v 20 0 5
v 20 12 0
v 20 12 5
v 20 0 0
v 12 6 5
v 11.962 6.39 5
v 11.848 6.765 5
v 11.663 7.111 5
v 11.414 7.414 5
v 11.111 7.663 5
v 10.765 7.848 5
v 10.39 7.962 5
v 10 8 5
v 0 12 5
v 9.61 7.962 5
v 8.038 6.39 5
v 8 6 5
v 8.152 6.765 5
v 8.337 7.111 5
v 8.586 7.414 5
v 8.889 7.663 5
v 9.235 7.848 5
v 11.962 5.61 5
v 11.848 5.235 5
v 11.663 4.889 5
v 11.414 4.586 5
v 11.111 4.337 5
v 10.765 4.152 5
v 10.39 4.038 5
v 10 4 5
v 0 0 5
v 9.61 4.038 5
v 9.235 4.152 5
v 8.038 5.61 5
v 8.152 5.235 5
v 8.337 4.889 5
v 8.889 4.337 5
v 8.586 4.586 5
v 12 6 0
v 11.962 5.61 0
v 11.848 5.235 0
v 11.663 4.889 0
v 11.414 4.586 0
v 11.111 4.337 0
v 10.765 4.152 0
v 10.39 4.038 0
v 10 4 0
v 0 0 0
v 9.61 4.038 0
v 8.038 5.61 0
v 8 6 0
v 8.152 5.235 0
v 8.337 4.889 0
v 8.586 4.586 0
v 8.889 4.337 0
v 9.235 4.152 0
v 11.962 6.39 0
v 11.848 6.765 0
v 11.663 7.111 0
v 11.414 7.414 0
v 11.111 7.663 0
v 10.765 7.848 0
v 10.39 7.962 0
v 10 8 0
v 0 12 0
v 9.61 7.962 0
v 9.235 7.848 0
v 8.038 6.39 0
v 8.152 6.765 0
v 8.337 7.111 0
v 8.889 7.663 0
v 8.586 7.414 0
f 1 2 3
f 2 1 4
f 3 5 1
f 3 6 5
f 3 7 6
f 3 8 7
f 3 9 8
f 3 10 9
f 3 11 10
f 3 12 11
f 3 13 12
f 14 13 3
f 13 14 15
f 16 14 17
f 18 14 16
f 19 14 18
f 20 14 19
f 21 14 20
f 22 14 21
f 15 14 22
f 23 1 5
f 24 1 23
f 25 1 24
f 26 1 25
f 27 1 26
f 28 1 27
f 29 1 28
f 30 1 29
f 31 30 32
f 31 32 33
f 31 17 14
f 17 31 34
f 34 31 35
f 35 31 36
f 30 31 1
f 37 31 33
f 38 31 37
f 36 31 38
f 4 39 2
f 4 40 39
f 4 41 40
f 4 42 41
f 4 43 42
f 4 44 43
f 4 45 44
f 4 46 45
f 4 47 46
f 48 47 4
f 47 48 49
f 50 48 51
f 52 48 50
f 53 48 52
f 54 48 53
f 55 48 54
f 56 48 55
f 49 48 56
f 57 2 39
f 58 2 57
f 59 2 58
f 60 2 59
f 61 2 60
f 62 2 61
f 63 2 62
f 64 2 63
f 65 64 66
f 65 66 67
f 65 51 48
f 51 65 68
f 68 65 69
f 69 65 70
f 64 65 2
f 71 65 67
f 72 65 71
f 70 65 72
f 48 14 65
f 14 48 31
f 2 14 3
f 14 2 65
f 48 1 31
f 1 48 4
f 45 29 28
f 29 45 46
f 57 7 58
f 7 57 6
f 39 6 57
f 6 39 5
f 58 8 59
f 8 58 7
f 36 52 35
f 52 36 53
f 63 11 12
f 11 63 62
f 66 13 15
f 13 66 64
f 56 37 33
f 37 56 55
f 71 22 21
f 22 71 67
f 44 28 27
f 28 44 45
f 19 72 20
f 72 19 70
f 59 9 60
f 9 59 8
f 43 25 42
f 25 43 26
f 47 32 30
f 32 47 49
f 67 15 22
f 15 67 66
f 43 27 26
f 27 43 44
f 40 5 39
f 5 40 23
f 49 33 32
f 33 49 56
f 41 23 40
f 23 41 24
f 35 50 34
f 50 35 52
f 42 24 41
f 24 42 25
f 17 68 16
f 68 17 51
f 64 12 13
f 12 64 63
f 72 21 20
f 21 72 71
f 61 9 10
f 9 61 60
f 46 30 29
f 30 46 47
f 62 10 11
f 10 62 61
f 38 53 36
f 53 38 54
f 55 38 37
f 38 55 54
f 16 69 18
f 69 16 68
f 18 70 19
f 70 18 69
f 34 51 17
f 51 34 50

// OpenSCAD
$fn = 32;

// ----------------------------------------------------------------------
// Micro pad: drilled pad, 5-20 mm class
// ----------------------------------------------------------------------

// --- parameters (mm) ---
pad_l = 20;               // pad length, X
pad_w = 12;               // pad width, Y
pad_t = 5;                // pad thickness, Z
hole_d = 4;               // through hole diameter

difference() {
  cube([pad_l, pad_w, pad_t]);
  translate([pad_l / 2, pad_w / 2, -1])
    cylinder(h = pad_t + 2, d = hole_d);
}
